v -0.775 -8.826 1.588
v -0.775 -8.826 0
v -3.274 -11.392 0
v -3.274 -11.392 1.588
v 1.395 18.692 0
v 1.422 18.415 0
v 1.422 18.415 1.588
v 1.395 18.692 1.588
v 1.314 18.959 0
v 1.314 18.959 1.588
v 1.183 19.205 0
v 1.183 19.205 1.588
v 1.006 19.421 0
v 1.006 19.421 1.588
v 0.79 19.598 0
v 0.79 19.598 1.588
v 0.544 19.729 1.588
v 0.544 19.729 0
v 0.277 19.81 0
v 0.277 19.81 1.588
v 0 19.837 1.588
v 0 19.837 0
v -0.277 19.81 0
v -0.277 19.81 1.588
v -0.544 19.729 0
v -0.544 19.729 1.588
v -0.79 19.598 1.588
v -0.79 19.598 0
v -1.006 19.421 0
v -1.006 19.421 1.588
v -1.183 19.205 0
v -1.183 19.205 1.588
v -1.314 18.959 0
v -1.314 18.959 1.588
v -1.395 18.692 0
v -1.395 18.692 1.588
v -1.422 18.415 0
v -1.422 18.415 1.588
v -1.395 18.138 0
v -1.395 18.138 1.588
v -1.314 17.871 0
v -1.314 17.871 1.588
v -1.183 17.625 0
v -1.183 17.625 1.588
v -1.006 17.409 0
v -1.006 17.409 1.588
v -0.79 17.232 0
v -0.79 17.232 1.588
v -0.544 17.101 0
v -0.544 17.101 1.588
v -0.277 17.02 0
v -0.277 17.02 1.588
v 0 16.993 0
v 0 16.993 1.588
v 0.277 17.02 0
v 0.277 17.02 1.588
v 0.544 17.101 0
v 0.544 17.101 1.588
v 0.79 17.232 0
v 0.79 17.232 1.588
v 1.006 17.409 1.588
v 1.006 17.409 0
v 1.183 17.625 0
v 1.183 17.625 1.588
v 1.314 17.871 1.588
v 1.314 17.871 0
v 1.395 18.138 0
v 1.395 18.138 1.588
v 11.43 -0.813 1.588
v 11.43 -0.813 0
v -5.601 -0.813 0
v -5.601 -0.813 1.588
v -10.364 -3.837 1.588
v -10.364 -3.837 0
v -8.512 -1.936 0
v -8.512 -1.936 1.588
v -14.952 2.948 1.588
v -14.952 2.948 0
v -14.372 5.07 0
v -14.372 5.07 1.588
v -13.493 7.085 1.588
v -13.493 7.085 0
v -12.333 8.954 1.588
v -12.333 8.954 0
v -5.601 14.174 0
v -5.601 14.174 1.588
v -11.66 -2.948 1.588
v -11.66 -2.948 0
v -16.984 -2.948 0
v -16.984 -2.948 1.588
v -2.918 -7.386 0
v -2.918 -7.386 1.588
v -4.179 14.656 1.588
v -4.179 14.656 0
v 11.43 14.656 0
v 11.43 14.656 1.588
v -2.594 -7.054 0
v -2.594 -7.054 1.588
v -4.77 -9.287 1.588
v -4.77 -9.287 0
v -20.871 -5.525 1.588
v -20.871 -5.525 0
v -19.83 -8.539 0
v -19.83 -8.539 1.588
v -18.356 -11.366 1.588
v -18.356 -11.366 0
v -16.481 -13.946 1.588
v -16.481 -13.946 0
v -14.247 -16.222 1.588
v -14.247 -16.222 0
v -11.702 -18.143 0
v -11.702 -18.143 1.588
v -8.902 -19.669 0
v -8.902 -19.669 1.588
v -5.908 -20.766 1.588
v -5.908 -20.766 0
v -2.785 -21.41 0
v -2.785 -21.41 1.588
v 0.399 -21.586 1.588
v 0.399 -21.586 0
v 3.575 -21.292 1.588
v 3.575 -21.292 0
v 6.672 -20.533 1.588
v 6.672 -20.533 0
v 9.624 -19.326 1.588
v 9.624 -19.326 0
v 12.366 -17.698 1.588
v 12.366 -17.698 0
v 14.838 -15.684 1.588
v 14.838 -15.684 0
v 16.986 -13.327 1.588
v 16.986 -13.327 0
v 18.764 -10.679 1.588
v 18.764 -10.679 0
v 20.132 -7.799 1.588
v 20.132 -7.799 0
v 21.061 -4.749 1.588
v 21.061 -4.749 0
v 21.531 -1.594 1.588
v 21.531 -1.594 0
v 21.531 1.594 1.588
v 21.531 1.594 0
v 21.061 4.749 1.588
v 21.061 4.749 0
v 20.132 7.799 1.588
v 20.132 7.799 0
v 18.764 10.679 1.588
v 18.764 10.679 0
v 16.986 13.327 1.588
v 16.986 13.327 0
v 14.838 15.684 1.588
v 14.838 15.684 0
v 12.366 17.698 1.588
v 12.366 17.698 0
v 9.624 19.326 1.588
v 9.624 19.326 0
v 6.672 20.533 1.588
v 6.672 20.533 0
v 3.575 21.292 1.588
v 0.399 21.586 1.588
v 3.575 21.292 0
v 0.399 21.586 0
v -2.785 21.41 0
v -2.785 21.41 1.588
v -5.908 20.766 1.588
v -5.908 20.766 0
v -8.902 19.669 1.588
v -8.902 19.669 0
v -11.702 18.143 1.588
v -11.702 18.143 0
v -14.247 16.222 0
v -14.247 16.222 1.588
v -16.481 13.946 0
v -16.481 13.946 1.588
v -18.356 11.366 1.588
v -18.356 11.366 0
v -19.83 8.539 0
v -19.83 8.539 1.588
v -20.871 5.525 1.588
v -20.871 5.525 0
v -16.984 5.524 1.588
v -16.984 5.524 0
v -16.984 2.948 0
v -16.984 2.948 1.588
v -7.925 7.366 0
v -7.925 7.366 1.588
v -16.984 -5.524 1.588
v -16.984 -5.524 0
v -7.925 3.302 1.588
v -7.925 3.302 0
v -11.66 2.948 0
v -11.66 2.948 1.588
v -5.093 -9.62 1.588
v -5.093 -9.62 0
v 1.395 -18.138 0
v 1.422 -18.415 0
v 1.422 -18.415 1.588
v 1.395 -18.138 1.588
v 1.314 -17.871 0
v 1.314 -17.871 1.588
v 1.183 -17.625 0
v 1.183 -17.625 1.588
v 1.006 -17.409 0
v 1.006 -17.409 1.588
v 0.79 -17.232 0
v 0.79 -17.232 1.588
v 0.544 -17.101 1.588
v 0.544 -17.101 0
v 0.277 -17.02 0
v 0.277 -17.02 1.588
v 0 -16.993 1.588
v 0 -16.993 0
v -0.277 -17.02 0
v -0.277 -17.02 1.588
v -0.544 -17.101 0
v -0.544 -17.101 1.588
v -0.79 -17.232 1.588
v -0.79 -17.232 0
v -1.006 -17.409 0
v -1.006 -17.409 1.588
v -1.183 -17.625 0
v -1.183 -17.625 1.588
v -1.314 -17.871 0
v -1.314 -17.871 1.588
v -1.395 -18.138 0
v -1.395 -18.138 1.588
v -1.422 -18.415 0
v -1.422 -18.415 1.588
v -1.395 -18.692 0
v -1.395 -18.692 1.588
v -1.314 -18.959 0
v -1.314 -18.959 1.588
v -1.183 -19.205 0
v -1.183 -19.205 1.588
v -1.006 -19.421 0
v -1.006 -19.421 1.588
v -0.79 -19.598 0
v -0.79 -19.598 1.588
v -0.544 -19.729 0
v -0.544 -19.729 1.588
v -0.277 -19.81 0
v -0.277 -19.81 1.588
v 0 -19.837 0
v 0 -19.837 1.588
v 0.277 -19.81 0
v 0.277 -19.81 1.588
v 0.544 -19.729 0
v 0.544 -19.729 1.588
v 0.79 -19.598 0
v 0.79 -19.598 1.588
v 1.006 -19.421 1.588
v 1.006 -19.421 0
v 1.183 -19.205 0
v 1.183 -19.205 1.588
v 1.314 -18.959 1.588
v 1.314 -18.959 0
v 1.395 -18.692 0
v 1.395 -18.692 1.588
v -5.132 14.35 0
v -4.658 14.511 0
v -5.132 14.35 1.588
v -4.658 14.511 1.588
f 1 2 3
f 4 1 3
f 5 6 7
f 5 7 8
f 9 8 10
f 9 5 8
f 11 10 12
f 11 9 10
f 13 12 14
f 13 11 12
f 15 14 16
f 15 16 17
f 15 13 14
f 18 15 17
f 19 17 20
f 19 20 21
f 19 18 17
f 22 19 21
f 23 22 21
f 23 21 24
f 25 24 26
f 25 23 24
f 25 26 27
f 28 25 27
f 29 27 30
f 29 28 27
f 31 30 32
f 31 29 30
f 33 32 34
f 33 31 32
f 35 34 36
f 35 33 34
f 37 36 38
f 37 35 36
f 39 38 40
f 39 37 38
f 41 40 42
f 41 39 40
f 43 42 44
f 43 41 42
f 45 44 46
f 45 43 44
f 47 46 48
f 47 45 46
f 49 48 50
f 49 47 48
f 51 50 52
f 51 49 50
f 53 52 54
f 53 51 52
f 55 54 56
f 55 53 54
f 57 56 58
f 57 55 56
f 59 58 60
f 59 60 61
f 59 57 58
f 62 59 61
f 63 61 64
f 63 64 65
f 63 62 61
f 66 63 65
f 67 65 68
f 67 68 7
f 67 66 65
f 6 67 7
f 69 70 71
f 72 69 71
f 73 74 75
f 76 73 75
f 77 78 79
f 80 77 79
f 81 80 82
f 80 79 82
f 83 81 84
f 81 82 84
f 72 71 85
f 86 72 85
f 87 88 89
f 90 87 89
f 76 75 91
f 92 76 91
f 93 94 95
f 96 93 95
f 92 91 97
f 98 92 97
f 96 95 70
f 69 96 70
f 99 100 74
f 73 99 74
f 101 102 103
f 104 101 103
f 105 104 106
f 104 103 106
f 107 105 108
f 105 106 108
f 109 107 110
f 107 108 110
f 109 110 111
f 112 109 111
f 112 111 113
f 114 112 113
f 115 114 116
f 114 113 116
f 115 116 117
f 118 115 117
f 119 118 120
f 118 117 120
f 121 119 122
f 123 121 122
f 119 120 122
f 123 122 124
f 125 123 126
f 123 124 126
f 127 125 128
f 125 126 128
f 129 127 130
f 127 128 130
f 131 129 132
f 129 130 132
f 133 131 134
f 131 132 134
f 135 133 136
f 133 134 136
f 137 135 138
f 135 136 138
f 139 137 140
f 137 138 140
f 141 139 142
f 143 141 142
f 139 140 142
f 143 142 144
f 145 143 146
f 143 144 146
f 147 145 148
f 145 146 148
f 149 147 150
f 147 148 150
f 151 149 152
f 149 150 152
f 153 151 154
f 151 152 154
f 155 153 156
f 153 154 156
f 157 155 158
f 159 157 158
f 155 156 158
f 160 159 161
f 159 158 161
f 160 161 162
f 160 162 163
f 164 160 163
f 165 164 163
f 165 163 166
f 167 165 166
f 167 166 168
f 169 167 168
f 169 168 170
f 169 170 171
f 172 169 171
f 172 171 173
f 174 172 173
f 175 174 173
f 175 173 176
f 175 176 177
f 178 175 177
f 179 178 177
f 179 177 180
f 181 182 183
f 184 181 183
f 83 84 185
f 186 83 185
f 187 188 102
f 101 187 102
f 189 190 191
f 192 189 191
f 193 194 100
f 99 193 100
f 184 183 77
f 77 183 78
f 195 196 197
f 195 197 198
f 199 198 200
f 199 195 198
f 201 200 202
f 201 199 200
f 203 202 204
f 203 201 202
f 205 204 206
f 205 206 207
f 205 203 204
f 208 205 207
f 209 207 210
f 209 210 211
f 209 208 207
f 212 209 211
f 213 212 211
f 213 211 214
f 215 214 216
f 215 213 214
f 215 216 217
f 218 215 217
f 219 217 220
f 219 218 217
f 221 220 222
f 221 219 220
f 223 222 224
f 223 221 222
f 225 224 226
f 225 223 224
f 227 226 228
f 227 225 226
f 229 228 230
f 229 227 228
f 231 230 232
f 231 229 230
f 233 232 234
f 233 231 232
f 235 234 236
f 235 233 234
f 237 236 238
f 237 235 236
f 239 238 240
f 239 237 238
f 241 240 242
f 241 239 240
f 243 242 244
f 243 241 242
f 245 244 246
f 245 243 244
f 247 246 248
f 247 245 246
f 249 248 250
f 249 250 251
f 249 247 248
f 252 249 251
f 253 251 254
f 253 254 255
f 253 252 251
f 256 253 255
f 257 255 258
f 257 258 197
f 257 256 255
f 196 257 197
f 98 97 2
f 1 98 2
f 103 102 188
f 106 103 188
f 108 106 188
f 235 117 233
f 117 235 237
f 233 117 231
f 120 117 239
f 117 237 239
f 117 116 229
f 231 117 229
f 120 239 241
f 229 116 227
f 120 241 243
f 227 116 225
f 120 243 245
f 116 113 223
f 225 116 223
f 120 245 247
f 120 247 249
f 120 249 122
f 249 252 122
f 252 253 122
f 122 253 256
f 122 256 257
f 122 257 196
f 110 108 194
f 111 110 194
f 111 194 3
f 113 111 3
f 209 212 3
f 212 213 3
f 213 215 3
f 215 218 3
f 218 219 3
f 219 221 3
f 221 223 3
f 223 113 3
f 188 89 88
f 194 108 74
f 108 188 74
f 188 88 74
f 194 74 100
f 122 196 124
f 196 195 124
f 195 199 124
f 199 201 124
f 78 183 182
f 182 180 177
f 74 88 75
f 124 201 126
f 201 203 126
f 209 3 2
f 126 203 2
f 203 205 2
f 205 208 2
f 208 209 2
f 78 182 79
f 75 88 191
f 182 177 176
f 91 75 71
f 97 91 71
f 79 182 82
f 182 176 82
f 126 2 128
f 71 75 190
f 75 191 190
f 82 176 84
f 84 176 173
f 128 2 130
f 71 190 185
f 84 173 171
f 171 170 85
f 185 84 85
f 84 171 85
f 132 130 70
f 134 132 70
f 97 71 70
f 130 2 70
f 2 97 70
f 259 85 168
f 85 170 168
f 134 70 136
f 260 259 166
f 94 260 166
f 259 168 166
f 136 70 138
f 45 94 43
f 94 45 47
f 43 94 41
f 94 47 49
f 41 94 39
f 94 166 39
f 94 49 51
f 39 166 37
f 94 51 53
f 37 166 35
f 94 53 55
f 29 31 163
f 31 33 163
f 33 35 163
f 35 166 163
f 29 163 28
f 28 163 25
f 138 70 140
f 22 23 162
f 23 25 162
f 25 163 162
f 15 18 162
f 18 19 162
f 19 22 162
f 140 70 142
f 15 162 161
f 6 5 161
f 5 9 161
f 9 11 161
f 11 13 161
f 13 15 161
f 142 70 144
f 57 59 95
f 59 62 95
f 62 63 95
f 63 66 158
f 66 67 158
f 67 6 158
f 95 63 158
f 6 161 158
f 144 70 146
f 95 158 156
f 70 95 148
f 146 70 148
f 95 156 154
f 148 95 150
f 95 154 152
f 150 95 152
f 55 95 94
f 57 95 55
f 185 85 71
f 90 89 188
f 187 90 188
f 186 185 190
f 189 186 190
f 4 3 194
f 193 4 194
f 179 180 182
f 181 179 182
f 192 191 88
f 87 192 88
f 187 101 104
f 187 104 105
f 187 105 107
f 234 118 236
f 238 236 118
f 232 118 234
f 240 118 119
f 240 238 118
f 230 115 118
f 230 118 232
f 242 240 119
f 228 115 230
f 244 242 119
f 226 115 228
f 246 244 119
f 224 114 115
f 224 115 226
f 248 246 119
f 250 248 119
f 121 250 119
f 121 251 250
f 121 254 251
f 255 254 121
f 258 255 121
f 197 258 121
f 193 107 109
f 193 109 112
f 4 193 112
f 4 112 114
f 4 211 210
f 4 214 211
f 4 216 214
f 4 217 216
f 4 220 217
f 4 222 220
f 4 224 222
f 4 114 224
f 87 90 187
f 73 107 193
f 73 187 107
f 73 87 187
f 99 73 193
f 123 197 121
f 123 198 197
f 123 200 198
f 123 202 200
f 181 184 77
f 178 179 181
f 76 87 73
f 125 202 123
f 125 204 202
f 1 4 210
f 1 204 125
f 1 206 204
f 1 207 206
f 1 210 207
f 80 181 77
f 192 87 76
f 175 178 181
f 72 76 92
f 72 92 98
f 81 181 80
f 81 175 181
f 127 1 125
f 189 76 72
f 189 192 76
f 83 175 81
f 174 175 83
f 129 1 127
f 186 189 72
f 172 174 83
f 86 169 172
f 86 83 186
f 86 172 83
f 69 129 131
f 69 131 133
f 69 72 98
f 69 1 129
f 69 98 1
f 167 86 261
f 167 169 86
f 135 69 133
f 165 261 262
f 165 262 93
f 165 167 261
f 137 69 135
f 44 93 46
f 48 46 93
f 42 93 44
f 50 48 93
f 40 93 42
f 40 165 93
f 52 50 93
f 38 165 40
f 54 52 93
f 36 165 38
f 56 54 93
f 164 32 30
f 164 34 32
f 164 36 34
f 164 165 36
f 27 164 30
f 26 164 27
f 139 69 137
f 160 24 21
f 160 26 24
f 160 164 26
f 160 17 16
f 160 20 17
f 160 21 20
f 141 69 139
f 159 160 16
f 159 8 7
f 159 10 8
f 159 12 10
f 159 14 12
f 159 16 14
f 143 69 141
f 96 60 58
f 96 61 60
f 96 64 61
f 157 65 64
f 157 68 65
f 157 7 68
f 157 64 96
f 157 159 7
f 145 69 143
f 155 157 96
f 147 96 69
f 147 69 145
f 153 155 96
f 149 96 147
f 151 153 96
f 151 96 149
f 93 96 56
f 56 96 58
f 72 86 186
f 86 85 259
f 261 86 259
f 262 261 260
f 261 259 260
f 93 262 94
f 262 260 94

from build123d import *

# Parameters (mm, degrees)
SKETCH1_R           = 1.4224
BOSS_EXTRUDE2_DEPTH = 1.5875


with BuildPart() as part:
    # Sketch1 → Boss-Extrude2 (new body)
    with BuildSketch(Plane.XY):
        with BuildLine():
            Line((-7.9248, 3.302), (-11.65986156, 2.948480848))
            Line((-11.65986156, 2.948480848), (-11.65986156, -2.948480848))
            Line((-11.65986156, -2.948480848), (-16.984058744, -2.948480848))
            Line((-16.984058744, -2.948480848), (-16.984058744, -5.5245))
            Line((-16.984058744, -5.5245), (-20.871224203, -5.5245))
            ThreePointArc((-20.871224203, -5.5245), (21.59, 0), (-20.871224203, 5.5245))
            Line((-20.871224203, 5.5245), (-16.984058744, 5.5245))
            Line((-16.984058744, 5.5245), (-16.984058744, 2.948480848))
            Line((-16.984058744, 2.948480848), (-14.952058744, 2.948480848))
            ThreePointArc((-14.952058744, 2.948480848), (-13.968818521, 6.093415226), (-12.332576282, 8.9535))
            Line((-12.332576282, 8.9535), (-7.9248, 7.366))
            Line((-7.9248, 7.366), (-7.9248, 3.302))
        make_face()
        with BuildLine():
            Line((-5.6007, -0.8128), (-5.6007, 14.173558463))
            ThreePointArc((-5.6007, 14.173558463), (-4.895856129, 14.43219293), (-4.179129857, 14.6558))
            Line((-4.179129857, 14.6558), (4.179129857, 14.6558))
            Line((4.179129857, 14.6558), (11.43, 14.6558))
            Line((11.43, 14.6558), (11.43, -0.8128))
            Line((11.43, -0.8128), (-5.6007, -0.8128))
        make_face(mode=Mode.SUBTRACT)
        Polygon((-2.594132624, -7.054138602), (-0.7747, -8.8265), (-3.273729572, -11.3919), (-5.093162196, -9.619538602), (-4.769706241, -9.287492148), (-10.36446156, -3.837480848), (-8.512343898, -1.936173756), (-2.917588579, -7.386185056), align=None, mode=Mode.SUBTRACT)
        with Locations((0, -18.415)):
            Circle(SKETCH1_R, mode=Mode.SUBTRACT)
        with Locations((0, 18.415)):
            Circle(SKETCH1_R, mode=Mode.SUBTRACT)
    extrude(amount=BOSS_EXTRUDE2_DEPTH)


solid = part.part
